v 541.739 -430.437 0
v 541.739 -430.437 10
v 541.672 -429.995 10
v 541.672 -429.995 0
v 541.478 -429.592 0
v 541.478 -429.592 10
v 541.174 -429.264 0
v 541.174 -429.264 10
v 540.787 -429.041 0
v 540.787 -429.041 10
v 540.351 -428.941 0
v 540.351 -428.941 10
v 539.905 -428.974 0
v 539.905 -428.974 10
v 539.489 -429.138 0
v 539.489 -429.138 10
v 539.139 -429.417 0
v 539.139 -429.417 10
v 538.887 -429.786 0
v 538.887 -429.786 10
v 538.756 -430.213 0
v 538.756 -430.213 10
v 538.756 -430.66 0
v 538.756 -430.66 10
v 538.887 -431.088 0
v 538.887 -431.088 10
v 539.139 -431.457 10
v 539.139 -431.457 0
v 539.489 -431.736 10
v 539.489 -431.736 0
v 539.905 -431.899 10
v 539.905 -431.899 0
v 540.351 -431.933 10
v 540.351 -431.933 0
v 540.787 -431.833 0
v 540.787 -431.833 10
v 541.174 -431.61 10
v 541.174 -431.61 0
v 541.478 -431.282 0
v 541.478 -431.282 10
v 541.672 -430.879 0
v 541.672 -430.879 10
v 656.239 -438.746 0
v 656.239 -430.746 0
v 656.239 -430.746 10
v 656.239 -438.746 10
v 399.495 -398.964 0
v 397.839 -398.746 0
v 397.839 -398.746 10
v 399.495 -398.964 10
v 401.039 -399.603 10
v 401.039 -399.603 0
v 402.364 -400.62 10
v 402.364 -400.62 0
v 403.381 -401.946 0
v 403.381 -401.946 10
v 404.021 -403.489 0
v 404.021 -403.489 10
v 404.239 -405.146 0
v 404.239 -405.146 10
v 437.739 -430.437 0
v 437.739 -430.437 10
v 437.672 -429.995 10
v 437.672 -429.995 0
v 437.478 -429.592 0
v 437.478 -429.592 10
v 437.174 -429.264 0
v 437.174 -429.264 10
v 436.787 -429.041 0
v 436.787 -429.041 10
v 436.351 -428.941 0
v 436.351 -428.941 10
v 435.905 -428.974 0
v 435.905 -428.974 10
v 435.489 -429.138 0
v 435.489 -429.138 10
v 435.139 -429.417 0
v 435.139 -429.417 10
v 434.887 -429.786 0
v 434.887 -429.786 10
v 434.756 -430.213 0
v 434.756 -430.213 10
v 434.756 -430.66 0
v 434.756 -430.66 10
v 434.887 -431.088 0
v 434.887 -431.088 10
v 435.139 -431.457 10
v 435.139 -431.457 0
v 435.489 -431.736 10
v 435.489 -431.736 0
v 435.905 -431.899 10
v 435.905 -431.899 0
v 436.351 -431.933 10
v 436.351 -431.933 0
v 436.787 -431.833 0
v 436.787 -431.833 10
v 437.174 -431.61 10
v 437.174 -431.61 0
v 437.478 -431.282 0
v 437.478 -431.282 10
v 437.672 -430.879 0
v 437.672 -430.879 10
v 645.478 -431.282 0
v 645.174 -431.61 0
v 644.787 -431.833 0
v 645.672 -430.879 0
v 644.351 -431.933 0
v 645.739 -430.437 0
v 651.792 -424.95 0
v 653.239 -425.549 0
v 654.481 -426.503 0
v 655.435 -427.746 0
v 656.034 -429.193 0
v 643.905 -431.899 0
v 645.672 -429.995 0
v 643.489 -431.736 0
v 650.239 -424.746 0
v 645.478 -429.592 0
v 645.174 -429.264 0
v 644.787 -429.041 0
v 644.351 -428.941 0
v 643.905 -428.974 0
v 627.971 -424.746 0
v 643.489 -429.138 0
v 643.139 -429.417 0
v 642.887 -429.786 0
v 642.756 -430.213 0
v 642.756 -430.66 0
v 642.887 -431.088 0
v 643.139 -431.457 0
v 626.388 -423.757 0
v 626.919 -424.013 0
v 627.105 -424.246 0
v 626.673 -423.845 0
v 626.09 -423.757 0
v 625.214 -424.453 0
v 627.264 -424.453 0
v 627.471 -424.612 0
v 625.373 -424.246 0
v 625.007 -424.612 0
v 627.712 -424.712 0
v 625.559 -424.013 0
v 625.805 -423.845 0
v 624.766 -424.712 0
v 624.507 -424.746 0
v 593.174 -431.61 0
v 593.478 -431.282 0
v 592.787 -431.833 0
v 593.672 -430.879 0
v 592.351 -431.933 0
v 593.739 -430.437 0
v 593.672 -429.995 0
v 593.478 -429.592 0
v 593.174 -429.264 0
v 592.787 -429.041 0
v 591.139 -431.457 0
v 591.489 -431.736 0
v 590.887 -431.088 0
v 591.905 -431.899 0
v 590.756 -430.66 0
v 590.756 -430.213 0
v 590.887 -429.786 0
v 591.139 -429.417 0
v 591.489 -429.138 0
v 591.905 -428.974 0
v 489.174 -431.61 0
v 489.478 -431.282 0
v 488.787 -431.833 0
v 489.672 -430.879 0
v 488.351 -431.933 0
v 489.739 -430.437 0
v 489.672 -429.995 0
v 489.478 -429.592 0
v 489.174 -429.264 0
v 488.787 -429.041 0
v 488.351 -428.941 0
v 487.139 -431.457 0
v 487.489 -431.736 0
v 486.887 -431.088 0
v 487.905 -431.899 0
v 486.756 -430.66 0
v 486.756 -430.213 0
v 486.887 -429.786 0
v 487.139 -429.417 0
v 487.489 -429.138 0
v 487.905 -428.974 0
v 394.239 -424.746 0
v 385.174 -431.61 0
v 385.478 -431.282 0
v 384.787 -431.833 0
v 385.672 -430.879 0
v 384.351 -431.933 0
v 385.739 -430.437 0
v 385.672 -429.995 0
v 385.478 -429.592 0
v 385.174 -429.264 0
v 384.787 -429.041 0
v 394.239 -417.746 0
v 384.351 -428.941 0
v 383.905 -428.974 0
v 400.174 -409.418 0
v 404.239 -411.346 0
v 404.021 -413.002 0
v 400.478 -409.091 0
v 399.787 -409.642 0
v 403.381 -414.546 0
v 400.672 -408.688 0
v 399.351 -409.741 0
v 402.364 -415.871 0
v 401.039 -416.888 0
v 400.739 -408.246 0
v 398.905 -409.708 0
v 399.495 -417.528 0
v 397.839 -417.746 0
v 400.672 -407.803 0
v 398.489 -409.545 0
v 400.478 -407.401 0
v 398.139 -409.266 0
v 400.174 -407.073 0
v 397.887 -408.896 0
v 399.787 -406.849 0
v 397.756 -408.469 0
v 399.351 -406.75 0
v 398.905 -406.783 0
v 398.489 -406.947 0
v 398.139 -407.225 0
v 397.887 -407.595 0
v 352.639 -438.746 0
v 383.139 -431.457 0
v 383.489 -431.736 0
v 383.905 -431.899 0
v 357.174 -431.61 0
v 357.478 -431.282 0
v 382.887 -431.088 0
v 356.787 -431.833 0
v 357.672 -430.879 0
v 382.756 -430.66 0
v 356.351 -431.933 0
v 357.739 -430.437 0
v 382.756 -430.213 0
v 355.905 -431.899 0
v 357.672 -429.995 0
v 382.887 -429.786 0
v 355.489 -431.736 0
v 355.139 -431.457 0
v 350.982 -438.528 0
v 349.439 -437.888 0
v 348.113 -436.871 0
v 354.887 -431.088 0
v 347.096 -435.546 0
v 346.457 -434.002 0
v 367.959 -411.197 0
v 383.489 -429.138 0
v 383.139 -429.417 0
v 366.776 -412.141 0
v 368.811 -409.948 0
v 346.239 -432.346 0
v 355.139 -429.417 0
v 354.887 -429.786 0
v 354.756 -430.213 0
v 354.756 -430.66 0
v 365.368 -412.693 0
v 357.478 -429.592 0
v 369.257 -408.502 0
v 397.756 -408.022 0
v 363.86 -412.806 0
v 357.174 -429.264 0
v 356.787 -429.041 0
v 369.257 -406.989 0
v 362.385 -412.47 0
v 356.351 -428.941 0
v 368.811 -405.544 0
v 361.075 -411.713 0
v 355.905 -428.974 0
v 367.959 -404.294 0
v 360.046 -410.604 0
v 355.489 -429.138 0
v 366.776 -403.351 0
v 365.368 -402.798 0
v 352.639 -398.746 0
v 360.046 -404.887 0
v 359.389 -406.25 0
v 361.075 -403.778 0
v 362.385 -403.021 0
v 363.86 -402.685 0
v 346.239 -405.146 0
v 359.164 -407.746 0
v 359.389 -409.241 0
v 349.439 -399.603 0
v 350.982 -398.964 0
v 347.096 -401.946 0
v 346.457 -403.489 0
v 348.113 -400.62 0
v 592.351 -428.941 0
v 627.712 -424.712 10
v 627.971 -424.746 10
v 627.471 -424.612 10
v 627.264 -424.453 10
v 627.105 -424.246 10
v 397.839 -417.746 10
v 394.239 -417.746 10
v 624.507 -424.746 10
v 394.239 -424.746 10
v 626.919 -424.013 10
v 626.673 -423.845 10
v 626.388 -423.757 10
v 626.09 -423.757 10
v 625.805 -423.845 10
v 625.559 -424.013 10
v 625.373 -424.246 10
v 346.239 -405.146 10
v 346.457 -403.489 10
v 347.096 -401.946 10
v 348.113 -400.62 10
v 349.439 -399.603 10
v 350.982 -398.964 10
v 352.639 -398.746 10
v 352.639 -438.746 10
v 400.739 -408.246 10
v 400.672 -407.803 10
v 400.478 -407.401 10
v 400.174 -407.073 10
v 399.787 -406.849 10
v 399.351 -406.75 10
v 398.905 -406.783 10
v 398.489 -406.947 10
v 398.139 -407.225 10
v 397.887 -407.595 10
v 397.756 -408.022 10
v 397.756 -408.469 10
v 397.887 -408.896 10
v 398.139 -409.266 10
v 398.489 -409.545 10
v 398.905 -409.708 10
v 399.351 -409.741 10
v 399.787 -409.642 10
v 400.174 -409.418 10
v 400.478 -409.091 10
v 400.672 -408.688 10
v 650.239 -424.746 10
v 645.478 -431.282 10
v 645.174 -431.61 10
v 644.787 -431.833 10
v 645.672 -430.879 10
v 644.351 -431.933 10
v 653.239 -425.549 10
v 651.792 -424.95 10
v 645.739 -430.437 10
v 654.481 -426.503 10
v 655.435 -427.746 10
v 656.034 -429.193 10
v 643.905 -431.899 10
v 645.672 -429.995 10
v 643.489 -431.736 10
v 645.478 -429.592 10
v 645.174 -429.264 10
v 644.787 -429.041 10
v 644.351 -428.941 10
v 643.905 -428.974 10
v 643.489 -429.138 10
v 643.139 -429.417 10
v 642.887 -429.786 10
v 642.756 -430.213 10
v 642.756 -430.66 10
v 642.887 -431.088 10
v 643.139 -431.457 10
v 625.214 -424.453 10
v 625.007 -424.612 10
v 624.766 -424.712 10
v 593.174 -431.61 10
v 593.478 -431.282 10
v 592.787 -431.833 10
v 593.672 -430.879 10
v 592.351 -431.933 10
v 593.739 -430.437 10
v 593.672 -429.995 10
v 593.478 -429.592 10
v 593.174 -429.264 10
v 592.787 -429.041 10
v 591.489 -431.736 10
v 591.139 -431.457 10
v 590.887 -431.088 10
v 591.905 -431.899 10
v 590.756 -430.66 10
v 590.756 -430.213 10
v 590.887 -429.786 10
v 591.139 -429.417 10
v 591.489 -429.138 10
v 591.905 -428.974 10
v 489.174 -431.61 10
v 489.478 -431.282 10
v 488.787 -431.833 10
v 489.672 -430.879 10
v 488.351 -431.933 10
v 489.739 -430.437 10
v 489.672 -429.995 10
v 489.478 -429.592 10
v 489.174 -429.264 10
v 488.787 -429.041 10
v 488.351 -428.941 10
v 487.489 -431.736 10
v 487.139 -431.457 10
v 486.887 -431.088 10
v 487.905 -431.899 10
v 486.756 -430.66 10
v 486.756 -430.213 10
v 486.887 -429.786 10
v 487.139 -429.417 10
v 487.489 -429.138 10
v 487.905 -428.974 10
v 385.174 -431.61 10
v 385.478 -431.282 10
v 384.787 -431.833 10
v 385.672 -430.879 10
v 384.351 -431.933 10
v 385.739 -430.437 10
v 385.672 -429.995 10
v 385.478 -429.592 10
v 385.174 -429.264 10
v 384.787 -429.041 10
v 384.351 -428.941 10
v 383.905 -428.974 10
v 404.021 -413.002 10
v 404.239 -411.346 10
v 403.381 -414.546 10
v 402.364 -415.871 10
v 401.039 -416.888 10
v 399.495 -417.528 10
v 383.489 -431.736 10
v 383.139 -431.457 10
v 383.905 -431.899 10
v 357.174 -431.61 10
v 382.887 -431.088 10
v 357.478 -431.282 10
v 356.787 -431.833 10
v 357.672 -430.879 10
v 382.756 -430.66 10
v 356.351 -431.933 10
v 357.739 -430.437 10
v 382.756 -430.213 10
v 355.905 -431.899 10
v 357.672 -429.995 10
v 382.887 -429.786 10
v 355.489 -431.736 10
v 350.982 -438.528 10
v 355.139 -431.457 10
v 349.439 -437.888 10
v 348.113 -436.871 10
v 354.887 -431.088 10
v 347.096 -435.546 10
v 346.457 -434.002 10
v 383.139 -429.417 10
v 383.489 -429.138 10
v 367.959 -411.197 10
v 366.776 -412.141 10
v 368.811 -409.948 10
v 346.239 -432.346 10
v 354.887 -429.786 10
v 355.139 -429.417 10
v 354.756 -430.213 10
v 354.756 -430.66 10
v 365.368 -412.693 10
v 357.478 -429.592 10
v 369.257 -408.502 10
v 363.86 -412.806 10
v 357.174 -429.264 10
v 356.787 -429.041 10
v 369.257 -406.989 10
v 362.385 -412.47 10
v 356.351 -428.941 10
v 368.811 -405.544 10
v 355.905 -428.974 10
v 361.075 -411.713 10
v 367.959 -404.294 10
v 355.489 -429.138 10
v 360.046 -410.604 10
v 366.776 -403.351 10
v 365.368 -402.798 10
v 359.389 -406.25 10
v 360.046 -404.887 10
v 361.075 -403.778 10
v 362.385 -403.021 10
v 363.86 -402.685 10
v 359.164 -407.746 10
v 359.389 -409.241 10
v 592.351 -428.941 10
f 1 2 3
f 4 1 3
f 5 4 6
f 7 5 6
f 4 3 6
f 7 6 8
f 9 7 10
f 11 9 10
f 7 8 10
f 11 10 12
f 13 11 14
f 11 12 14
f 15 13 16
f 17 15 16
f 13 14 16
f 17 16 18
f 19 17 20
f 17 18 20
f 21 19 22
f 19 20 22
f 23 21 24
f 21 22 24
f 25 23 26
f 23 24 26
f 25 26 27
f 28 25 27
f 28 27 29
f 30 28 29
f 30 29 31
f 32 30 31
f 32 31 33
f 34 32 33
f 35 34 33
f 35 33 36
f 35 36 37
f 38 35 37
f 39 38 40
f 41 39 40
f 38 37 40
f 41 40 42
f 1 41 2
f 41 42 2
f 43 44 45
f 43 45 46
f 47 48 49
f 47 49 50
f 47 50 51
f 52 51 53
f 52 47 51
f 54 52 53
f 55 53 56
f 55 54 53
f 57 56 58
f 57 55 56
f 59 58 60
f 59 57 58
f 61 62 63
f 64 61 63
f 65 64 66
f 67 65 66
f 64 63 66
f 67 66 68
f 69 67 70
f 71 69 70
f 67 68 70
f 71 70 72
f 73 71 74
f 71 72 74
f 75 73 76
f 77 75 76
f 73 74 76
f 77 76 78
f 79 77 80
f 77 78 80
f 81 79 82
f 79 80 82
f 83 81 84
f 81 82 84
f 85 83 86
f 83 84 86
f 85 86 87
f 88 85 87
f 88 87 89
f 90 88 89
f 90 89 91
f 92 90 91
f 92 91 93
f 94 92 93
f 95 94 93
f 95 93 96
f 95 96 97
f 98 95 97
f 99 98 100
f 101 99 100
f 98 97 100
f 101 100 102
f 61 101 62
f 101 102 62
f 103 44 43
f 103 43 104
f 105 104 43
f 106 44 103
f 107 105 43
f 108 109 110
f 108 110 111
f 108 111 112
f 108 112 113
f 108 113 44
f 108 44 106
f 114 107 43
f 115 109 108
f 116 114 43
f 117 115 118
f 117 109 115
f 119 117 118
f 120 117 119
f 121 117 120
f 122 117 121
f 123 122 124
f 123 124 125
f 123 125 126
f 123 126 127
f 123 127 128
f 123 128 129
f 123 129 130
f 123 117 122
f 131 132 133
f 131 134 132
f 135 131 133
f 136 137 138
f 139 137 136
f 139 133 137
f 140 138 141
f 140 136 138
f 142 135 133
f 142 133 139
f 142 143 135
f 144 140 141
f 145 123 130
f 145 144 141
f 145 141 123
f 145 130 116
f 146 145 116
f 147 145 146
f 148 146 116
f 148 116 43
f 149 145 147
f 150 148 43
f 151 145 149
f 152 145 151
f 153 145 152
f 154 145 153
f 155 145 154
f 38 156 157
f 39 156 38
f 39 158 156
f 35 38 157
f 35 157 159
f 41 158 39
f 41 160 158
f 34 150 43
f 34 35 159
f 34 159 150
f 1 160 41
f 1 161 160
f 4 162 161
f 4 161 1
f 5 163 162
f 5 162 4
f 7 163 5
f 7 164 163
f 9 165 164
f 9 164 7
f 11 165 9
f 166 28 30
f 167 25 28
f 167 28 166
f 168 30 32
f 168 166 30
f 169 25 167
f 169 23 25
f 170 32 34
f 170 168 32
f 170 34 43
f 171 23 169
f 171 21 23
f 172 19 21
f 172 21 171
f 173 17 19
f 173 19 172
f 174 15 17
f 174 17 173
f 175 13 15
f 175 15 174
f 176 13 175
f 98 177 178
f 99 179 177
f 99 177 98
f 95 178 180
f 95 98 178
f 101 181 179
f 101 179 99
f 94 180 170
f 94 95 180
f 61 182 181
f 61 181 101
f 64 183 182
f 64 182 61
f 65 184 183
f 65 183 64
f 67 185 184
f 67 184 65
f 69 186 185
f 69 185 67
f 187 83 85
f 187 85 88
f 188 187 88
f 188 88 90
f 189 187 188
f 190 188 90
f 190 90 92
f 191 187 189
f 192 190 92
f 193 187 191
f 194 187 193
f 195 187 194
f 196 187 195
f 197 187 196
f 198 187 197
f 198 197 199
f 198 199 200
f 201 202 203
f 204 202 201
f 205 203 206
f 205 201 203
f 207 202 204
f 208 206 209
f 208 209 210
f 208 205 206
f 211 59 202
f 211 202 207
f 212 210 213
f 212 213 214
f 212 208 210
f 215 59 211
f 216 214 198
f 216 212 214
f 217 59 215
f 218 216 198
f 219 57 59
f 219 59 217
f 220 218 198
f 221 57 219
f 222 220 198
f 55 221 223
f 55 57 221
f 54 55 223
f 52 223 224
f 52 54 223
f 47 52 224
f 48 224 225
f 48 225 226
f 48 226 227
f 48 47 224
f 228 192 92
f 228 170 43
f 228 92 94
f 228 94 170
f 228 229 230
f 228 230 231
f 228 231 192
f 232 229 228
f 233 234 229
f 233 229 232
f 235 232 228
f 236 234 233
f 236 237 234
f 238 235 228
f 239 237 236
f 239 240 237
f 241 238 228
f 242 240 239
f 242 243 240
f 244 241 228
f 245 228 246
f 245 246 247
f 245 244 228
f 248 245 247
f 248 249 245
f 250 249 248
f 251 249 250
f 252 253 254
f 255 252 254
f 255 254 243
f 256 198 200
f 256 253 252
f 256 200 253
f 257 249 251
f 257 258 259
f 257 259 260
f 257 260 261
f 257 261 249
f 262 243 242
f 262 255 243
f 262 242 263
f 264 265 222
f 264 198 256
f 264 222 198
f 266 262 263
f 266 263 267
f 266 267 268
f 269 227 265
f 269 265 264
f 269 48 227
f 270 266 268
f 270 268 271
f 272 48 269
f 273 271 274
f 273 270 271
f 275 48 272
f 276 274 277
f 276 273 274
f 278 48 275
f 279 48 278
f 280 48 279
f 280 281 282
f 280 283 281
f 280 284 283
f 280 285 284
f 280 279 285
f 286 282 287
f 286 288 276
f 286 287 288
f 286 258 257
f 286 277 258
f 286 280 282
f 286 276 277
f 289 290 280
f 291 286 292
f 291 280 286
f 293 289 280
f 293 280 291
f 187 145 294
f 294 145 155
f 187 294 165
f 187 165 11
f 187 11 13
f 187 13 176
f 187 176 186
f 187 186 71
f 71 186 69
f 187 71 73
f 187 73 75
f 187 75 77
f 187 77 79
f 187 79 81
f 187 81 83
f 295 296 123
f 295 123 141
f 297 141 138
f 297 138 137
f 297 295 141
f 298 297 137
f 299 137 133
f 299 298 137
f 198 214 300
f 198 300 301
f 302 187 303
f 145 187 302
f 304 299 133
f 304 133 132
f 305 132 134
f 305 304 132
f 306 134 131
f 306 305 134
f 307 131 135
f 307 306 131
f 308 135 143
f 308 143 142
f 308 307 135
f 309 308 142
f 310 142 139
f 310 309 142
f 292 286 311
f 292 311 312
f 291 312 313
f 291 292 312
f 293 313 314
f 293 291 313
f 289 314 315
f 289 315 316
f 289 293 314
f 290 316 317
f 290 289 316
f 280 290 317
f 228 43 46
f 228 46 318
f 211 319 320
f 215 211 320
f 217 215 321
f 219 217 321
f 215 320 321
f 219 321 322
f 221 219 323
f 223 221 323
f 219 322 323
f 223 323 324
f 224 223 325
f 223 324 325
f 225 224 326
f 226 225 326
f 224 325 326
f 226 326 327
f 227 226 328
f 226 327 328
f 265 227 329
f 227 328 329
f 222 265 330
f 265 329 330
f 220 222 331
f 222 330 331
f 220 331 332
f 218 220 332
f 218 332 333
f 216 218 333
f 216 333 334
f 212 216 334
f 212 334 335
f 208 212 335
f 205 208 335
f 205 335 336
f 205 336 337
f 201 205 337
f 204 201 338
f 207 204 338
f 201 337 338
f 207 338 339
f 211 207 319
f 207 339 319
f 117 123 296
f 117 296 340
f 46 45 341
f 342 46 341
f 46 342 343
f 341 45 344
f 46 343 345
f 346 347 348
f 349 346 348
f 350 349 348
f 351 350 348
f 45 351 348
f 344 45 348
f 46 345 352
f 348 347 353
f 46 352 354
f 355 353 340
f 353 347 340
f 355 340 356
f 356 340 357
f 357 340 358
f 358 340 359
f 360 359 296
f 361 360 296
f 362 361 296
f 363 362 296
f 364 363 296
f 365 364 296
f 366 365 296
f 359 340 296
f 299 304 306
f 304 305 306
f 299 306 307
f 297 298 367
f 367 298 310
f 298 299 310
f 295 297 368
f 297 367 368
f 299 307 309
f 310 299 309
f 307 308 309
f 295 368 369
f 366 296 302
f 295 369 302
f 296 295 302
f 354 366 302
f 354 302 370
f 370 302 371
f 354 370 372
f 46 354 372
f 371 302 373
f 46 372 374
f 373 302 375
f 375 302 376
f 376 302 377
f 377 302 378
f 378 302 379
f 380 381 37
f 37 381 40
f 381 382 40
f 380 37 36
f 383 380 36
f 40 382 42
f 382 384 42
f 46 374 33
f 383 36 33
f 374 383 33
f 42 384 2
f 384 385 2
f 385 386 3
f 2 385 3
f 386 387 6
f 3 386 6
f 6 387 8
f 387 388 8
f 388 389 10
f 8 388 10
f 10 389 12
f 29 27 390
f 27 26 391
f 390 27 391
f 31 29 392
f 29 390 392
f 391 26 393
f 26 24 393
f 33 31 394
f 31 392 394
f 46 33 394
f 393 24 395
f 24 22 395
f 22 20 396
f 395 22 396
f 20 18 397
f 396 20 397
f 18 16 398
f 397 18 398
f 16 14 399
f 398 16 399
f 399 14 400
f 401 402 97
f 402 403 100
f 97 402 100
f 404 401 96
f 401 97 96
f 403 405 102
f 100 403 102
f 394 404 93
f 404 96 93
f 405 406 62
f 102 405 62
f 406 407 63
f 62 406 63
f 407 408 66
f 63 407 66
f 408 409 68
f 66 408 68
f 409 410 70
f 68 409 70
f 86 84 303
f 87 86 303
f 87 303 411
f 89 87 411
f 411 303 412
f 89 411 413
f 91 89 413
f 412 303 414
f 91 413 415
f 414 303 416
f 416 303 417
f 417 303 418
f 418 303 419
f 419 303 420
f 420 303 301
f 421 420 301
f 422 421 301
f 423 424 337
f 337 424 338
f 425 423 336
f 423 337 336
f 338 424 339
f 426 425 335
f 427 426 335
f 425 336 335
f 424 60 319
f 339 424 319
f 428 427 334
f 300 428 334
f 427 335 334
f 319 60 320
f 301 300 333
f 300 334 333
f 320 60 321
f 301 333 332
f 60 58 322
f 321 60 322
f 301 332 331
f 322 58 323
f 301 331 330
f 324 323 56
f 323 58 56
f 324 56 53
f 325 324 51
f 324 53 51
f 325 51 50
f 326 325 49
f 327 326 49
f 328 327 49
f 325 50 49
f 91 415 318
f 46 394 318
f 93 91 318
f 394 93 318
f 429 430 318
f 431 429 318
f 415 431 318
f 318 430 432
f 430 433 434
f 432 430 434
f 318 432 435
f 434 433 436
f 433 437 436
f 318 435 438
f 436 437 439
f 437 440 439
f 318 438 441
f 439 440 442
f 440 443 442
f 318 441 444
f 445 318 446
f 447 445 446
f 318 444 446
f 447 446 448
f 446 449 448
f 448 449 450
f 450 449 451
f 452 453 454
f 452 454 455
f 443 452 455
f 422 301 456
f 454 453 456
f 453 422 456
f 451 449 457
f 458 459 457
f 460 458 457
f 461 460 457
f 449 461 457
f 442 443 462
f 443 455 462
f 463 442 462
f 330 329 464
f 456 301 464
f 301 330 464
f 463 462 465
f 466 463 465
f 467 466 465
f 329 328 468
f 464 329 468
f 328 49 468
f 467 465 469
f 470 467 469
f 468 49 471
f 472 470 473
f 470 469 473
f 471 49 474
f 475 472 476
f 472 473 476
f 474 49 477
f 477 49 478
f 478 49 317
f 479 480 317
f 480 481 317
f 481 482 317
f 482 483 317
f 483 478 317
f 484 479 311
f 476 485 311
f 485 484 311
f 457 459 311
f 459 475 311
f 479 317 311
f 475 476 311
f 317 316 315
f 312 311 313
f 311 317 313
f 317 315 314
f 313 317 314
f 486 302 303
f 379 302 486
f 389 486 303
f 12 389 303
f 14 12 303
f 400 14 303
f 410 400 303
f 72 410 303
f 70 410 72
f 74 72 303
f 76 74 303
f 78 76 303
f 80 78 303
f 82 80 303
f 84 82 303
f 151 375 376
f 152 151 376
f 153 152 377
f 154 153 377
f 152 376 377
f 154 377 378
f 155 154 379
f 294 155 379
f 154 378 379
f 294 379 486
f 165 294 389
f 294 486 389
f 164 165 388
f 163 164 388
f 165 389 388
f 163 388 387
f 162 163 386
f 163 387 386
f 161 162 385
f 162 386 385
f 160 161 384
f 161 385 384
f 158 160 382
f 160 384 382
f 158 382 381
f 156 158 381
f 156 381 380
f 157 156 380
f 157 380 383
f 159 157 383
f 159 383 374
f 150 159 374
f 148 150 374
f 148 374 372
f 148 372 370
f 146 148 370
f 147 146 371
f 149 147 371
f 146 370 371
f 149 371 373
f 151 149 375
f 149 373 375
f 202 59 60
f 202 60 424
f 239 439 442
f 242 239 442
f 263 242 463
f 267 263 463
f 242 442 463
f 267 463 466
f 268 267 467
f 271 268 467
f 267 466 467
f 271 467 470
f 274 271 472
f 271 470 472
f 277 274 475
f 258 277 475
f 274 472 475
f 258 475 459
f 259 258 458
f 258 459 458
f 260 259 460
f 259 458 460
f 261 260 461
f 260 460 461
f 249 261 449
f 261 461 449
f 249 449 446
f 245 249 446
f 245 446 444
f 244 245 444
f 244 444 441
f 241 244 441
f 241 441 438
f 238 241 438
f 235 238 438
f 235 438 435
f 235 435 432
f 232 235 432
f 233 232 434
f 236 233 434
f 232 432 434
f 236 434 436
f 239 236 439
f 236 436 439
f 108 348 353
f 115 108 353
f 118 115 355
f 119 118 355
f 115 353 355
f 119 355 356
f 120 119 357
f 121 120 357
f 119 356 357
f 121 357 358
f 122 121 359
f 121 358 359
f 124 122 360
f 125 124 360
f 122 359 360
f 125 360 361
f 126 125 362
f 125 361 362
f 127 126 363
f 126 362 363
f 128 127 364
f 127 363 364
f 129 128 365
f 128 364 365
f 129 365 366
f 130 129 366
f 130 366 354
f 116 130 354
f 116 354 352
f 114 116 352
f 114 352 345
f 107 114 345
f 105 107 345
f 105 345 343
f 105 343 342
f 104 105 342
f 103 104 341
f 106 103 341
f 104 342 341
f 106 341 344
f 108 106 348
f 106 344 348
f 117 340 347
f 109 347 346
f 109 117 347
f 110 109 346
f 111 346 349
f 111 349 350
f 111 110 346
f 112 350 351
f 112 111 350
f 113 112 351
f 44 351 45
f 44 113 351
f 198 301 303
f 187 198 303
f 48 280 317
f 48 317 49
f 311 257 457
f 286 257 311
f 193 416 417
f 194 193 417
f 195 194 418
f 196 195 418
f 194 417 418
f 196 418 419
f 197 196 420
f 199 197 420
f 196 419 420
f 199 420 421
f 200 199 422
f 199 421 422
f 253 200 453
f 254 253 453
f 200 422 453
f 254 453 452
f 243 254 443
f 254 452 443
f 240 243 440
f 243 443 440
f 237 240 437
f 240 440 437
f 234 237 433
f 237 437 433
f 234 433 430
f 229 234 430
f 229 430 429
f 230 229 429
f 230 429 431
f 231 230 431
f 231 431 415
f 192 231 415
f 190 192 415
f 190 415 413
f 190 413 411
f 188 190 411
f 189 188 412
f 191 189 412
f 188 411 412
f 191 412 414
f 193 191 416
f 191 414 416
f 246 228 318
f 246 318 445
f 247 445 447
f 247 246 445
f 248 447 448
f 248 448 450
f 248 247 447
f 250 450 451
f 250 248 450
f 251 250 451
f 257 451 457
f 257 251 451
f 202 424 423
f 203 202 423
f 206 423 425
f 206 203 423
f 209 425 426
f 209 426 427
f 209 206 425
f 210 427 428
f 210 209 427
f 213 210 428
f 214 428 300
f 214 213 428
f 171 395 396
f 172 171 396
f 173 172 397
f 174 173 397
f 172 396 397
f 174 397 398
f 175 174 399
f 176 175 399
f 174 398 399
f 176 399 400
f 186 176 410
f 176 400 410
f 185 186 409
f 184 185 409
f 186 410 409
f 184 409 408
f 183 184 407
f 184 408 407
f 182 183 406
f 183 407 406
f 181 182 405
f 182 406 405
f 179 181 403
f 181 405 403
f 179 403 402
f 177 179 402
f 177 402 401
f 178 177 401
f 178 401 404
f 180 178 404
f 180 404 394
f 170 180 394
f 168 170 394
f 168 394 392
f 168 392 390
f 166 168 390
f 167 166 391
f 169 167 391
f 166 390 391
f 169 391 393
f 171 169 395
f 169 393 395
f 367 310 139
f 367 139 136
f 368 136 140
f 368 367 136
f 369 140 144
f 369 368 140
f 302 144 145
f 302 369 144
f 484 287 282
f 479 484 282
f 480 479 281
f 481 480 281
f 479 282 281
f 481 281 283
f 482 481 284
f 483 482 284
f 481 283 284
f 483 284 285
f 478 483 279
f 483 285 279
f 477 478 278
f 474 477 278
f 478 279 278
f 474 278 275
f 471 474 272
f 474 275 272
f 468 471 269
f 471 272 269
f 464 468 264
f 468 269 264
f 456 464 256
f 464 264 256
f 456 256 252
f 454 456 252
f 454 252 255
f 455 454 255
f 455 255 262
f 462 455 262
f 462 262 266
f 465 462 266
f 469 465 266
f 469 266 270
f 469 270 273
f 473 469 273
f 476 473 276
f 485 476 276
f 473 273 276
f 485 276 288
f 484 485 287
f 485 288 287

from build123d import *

# Parameters (mm, degrees)
DODANIE_WYCI_GNI_CIE1_DEPTH = 10
SZKIC2_R                    = 1.5
WYTNIJ_WYCI_GNI_CIE1_DEPTH  = 10
SZKIC5_R                    = 5.075
WYTNIJ_WYCI_GNI_CIE2_DEPTH  = 10
WYTNIJ_WYCI_GNI_CIE3_DEPTH  = 10
DODANIE_WYCI_GNI_CIE2_DEPTH = 10


with BuildPart() as part:
    # Szkic1 → Dodanie-wyciągnięcie1 (new body)
    with BuildSketch(Plane.XY):
        with BuildLine():
            Line((656.238844698, -438.745595983), (352.638844698, -438.745595983))
            ThreePointArc((352.638844698, -438.745595983), (348.113361298, -436.871079382), (346.238844698, -432.345595983))
            Line((346.238844698, -432.345595983), (346.238844698, -405.145595983))
            ThreePointArc((346.238844698, -405.145595983), (348.113361298, -400.620112583), (352.638844698, -398.745595983))
            Line((352.638844698, -398.745595983), (394.238844698, -398.745595983))
            Line((394.238844698, -398.745595983), (397.838844698, -398.745595983))
            ThreePointArc((397.838844698, -398.745595983), (402.364328097, -400.620112583), (404.238844698, -405.145595983))
            Line((404.238844698, -405.145595983), (404.238844698, -411.345595983))
            ThreePointArc((404.238844698, -411.345595983), (402.364328097, -415.871079382), (397.838844698, -417.745595983))
            Line((397.838844698, -417.745595983), (394.238844698, -417.745595983))
            Line((394.238844698, -417.745595983), (394.238844698, -424.745595983))
            Line((394.238844698, -424.745595983), (656.238844698, -424.745595983))
            Line((656.238844698, -424.745595983), (656.238844698, -438.745595983))
        make_face()
    extrude(amount=DODANIE_WYCI_GNI_CIE1_DEPTH)

    # Szkic2 → Wytnij-wyciągnięcie1 (cut)
    with BuildSketch(Plane.XY.offset(10)):
        with Locations((644.238844698, -430.4368906)):
            Circle(SZKIC2_R)
        with Locations((592.238844698, -430.4368906)):
            Circle(SZKIC2_R)
        with Locations((540.238844698, -430.4368906)):
            Circle(SZKIC2_R)
        with Locations((488.238844698, -430.4368906)):
            Circle(SZKIC2_R)
        with Locations((436.238844698, -430.4368906)):
            Circle(SZKIC2_R)
        with Locations((384.238844698, -430.4368906)):
            Circle(SZKIC2_R)
        with Locations((356.238844698, -430.4368906)):
            Circle(SZKIC2_R)
        with Locations((399.238844698, -408.245595983)):
            Circle(SZKIC2_R)
    extrude(amount=-WYTNIJ_WYCI_GNI_CIE1_DEPTH, mode=Mode.SUBTRACT)

    # Szkic5 → Wytnij-wyciągnięcie2 (cut)
    with BuildSketch(Plane(origin=(0, 0, 0), x_dir=(-1, 0, 0), z_dir=(0, 0, -1))):
        with Locations((-364.238844698, -407.745595983)):
            Circle(SZKIC5_R)
    extrude(amount=-WYTNIJ_WYCI_GNI_CIE2_DEPTH, mode=Mode.SUBTRACT)

    # Szkic6 → Wytnij-wyciągnięcie3 (cut)
    with BuildSketch(Plane(origin=(0, 0, 0), x_dir=(-1, 0, 0), z_dir=(0, 0, -1))):
        with BuildLine():
            Line((-656.238844698, -430.745595983), (-656.238844698, -424.745595983))
            Line((-656.238844698, -424.745595983), (-650.238844698, -424.745595983))
            ThreePointArc((-650.238844698, -424.745595983), (-654.481485385, -426.502955296), (-656.238844698, -430.745595983))
        make_face()
    extrude(amount=-WYTNIJ_WYCI_GNI_CIE3_DEPTH, mode=Mode.SUBTRACT)

    # Szkic7 → Dodanie-wyciągnięcie2 (add)
    with BuildSketch(Plane.XY.offset(10)):
        with BuildLine():
            Line((624.50679389, -424.745595983), (627.970895505, -424.745595983))
            ThreePointArc((627.970895505, -424.745595983), (627.470895505, -424.611621386), (627.104870102, -424.245595983))
            ThreePointArc((627.104870102, -424.245595983), (626.238844698, -423.745595983), (625.372819294, -424.245595983))
            ThreePointArc((625.372819294, -424.245595983), (625.00679389, -424.611621386), (624.50679389, -424.745595983))
        make_face()
    extrude(amount=-DODANIE_WYCI_GNI_CIE2_DEPTH)


solid = part.part
